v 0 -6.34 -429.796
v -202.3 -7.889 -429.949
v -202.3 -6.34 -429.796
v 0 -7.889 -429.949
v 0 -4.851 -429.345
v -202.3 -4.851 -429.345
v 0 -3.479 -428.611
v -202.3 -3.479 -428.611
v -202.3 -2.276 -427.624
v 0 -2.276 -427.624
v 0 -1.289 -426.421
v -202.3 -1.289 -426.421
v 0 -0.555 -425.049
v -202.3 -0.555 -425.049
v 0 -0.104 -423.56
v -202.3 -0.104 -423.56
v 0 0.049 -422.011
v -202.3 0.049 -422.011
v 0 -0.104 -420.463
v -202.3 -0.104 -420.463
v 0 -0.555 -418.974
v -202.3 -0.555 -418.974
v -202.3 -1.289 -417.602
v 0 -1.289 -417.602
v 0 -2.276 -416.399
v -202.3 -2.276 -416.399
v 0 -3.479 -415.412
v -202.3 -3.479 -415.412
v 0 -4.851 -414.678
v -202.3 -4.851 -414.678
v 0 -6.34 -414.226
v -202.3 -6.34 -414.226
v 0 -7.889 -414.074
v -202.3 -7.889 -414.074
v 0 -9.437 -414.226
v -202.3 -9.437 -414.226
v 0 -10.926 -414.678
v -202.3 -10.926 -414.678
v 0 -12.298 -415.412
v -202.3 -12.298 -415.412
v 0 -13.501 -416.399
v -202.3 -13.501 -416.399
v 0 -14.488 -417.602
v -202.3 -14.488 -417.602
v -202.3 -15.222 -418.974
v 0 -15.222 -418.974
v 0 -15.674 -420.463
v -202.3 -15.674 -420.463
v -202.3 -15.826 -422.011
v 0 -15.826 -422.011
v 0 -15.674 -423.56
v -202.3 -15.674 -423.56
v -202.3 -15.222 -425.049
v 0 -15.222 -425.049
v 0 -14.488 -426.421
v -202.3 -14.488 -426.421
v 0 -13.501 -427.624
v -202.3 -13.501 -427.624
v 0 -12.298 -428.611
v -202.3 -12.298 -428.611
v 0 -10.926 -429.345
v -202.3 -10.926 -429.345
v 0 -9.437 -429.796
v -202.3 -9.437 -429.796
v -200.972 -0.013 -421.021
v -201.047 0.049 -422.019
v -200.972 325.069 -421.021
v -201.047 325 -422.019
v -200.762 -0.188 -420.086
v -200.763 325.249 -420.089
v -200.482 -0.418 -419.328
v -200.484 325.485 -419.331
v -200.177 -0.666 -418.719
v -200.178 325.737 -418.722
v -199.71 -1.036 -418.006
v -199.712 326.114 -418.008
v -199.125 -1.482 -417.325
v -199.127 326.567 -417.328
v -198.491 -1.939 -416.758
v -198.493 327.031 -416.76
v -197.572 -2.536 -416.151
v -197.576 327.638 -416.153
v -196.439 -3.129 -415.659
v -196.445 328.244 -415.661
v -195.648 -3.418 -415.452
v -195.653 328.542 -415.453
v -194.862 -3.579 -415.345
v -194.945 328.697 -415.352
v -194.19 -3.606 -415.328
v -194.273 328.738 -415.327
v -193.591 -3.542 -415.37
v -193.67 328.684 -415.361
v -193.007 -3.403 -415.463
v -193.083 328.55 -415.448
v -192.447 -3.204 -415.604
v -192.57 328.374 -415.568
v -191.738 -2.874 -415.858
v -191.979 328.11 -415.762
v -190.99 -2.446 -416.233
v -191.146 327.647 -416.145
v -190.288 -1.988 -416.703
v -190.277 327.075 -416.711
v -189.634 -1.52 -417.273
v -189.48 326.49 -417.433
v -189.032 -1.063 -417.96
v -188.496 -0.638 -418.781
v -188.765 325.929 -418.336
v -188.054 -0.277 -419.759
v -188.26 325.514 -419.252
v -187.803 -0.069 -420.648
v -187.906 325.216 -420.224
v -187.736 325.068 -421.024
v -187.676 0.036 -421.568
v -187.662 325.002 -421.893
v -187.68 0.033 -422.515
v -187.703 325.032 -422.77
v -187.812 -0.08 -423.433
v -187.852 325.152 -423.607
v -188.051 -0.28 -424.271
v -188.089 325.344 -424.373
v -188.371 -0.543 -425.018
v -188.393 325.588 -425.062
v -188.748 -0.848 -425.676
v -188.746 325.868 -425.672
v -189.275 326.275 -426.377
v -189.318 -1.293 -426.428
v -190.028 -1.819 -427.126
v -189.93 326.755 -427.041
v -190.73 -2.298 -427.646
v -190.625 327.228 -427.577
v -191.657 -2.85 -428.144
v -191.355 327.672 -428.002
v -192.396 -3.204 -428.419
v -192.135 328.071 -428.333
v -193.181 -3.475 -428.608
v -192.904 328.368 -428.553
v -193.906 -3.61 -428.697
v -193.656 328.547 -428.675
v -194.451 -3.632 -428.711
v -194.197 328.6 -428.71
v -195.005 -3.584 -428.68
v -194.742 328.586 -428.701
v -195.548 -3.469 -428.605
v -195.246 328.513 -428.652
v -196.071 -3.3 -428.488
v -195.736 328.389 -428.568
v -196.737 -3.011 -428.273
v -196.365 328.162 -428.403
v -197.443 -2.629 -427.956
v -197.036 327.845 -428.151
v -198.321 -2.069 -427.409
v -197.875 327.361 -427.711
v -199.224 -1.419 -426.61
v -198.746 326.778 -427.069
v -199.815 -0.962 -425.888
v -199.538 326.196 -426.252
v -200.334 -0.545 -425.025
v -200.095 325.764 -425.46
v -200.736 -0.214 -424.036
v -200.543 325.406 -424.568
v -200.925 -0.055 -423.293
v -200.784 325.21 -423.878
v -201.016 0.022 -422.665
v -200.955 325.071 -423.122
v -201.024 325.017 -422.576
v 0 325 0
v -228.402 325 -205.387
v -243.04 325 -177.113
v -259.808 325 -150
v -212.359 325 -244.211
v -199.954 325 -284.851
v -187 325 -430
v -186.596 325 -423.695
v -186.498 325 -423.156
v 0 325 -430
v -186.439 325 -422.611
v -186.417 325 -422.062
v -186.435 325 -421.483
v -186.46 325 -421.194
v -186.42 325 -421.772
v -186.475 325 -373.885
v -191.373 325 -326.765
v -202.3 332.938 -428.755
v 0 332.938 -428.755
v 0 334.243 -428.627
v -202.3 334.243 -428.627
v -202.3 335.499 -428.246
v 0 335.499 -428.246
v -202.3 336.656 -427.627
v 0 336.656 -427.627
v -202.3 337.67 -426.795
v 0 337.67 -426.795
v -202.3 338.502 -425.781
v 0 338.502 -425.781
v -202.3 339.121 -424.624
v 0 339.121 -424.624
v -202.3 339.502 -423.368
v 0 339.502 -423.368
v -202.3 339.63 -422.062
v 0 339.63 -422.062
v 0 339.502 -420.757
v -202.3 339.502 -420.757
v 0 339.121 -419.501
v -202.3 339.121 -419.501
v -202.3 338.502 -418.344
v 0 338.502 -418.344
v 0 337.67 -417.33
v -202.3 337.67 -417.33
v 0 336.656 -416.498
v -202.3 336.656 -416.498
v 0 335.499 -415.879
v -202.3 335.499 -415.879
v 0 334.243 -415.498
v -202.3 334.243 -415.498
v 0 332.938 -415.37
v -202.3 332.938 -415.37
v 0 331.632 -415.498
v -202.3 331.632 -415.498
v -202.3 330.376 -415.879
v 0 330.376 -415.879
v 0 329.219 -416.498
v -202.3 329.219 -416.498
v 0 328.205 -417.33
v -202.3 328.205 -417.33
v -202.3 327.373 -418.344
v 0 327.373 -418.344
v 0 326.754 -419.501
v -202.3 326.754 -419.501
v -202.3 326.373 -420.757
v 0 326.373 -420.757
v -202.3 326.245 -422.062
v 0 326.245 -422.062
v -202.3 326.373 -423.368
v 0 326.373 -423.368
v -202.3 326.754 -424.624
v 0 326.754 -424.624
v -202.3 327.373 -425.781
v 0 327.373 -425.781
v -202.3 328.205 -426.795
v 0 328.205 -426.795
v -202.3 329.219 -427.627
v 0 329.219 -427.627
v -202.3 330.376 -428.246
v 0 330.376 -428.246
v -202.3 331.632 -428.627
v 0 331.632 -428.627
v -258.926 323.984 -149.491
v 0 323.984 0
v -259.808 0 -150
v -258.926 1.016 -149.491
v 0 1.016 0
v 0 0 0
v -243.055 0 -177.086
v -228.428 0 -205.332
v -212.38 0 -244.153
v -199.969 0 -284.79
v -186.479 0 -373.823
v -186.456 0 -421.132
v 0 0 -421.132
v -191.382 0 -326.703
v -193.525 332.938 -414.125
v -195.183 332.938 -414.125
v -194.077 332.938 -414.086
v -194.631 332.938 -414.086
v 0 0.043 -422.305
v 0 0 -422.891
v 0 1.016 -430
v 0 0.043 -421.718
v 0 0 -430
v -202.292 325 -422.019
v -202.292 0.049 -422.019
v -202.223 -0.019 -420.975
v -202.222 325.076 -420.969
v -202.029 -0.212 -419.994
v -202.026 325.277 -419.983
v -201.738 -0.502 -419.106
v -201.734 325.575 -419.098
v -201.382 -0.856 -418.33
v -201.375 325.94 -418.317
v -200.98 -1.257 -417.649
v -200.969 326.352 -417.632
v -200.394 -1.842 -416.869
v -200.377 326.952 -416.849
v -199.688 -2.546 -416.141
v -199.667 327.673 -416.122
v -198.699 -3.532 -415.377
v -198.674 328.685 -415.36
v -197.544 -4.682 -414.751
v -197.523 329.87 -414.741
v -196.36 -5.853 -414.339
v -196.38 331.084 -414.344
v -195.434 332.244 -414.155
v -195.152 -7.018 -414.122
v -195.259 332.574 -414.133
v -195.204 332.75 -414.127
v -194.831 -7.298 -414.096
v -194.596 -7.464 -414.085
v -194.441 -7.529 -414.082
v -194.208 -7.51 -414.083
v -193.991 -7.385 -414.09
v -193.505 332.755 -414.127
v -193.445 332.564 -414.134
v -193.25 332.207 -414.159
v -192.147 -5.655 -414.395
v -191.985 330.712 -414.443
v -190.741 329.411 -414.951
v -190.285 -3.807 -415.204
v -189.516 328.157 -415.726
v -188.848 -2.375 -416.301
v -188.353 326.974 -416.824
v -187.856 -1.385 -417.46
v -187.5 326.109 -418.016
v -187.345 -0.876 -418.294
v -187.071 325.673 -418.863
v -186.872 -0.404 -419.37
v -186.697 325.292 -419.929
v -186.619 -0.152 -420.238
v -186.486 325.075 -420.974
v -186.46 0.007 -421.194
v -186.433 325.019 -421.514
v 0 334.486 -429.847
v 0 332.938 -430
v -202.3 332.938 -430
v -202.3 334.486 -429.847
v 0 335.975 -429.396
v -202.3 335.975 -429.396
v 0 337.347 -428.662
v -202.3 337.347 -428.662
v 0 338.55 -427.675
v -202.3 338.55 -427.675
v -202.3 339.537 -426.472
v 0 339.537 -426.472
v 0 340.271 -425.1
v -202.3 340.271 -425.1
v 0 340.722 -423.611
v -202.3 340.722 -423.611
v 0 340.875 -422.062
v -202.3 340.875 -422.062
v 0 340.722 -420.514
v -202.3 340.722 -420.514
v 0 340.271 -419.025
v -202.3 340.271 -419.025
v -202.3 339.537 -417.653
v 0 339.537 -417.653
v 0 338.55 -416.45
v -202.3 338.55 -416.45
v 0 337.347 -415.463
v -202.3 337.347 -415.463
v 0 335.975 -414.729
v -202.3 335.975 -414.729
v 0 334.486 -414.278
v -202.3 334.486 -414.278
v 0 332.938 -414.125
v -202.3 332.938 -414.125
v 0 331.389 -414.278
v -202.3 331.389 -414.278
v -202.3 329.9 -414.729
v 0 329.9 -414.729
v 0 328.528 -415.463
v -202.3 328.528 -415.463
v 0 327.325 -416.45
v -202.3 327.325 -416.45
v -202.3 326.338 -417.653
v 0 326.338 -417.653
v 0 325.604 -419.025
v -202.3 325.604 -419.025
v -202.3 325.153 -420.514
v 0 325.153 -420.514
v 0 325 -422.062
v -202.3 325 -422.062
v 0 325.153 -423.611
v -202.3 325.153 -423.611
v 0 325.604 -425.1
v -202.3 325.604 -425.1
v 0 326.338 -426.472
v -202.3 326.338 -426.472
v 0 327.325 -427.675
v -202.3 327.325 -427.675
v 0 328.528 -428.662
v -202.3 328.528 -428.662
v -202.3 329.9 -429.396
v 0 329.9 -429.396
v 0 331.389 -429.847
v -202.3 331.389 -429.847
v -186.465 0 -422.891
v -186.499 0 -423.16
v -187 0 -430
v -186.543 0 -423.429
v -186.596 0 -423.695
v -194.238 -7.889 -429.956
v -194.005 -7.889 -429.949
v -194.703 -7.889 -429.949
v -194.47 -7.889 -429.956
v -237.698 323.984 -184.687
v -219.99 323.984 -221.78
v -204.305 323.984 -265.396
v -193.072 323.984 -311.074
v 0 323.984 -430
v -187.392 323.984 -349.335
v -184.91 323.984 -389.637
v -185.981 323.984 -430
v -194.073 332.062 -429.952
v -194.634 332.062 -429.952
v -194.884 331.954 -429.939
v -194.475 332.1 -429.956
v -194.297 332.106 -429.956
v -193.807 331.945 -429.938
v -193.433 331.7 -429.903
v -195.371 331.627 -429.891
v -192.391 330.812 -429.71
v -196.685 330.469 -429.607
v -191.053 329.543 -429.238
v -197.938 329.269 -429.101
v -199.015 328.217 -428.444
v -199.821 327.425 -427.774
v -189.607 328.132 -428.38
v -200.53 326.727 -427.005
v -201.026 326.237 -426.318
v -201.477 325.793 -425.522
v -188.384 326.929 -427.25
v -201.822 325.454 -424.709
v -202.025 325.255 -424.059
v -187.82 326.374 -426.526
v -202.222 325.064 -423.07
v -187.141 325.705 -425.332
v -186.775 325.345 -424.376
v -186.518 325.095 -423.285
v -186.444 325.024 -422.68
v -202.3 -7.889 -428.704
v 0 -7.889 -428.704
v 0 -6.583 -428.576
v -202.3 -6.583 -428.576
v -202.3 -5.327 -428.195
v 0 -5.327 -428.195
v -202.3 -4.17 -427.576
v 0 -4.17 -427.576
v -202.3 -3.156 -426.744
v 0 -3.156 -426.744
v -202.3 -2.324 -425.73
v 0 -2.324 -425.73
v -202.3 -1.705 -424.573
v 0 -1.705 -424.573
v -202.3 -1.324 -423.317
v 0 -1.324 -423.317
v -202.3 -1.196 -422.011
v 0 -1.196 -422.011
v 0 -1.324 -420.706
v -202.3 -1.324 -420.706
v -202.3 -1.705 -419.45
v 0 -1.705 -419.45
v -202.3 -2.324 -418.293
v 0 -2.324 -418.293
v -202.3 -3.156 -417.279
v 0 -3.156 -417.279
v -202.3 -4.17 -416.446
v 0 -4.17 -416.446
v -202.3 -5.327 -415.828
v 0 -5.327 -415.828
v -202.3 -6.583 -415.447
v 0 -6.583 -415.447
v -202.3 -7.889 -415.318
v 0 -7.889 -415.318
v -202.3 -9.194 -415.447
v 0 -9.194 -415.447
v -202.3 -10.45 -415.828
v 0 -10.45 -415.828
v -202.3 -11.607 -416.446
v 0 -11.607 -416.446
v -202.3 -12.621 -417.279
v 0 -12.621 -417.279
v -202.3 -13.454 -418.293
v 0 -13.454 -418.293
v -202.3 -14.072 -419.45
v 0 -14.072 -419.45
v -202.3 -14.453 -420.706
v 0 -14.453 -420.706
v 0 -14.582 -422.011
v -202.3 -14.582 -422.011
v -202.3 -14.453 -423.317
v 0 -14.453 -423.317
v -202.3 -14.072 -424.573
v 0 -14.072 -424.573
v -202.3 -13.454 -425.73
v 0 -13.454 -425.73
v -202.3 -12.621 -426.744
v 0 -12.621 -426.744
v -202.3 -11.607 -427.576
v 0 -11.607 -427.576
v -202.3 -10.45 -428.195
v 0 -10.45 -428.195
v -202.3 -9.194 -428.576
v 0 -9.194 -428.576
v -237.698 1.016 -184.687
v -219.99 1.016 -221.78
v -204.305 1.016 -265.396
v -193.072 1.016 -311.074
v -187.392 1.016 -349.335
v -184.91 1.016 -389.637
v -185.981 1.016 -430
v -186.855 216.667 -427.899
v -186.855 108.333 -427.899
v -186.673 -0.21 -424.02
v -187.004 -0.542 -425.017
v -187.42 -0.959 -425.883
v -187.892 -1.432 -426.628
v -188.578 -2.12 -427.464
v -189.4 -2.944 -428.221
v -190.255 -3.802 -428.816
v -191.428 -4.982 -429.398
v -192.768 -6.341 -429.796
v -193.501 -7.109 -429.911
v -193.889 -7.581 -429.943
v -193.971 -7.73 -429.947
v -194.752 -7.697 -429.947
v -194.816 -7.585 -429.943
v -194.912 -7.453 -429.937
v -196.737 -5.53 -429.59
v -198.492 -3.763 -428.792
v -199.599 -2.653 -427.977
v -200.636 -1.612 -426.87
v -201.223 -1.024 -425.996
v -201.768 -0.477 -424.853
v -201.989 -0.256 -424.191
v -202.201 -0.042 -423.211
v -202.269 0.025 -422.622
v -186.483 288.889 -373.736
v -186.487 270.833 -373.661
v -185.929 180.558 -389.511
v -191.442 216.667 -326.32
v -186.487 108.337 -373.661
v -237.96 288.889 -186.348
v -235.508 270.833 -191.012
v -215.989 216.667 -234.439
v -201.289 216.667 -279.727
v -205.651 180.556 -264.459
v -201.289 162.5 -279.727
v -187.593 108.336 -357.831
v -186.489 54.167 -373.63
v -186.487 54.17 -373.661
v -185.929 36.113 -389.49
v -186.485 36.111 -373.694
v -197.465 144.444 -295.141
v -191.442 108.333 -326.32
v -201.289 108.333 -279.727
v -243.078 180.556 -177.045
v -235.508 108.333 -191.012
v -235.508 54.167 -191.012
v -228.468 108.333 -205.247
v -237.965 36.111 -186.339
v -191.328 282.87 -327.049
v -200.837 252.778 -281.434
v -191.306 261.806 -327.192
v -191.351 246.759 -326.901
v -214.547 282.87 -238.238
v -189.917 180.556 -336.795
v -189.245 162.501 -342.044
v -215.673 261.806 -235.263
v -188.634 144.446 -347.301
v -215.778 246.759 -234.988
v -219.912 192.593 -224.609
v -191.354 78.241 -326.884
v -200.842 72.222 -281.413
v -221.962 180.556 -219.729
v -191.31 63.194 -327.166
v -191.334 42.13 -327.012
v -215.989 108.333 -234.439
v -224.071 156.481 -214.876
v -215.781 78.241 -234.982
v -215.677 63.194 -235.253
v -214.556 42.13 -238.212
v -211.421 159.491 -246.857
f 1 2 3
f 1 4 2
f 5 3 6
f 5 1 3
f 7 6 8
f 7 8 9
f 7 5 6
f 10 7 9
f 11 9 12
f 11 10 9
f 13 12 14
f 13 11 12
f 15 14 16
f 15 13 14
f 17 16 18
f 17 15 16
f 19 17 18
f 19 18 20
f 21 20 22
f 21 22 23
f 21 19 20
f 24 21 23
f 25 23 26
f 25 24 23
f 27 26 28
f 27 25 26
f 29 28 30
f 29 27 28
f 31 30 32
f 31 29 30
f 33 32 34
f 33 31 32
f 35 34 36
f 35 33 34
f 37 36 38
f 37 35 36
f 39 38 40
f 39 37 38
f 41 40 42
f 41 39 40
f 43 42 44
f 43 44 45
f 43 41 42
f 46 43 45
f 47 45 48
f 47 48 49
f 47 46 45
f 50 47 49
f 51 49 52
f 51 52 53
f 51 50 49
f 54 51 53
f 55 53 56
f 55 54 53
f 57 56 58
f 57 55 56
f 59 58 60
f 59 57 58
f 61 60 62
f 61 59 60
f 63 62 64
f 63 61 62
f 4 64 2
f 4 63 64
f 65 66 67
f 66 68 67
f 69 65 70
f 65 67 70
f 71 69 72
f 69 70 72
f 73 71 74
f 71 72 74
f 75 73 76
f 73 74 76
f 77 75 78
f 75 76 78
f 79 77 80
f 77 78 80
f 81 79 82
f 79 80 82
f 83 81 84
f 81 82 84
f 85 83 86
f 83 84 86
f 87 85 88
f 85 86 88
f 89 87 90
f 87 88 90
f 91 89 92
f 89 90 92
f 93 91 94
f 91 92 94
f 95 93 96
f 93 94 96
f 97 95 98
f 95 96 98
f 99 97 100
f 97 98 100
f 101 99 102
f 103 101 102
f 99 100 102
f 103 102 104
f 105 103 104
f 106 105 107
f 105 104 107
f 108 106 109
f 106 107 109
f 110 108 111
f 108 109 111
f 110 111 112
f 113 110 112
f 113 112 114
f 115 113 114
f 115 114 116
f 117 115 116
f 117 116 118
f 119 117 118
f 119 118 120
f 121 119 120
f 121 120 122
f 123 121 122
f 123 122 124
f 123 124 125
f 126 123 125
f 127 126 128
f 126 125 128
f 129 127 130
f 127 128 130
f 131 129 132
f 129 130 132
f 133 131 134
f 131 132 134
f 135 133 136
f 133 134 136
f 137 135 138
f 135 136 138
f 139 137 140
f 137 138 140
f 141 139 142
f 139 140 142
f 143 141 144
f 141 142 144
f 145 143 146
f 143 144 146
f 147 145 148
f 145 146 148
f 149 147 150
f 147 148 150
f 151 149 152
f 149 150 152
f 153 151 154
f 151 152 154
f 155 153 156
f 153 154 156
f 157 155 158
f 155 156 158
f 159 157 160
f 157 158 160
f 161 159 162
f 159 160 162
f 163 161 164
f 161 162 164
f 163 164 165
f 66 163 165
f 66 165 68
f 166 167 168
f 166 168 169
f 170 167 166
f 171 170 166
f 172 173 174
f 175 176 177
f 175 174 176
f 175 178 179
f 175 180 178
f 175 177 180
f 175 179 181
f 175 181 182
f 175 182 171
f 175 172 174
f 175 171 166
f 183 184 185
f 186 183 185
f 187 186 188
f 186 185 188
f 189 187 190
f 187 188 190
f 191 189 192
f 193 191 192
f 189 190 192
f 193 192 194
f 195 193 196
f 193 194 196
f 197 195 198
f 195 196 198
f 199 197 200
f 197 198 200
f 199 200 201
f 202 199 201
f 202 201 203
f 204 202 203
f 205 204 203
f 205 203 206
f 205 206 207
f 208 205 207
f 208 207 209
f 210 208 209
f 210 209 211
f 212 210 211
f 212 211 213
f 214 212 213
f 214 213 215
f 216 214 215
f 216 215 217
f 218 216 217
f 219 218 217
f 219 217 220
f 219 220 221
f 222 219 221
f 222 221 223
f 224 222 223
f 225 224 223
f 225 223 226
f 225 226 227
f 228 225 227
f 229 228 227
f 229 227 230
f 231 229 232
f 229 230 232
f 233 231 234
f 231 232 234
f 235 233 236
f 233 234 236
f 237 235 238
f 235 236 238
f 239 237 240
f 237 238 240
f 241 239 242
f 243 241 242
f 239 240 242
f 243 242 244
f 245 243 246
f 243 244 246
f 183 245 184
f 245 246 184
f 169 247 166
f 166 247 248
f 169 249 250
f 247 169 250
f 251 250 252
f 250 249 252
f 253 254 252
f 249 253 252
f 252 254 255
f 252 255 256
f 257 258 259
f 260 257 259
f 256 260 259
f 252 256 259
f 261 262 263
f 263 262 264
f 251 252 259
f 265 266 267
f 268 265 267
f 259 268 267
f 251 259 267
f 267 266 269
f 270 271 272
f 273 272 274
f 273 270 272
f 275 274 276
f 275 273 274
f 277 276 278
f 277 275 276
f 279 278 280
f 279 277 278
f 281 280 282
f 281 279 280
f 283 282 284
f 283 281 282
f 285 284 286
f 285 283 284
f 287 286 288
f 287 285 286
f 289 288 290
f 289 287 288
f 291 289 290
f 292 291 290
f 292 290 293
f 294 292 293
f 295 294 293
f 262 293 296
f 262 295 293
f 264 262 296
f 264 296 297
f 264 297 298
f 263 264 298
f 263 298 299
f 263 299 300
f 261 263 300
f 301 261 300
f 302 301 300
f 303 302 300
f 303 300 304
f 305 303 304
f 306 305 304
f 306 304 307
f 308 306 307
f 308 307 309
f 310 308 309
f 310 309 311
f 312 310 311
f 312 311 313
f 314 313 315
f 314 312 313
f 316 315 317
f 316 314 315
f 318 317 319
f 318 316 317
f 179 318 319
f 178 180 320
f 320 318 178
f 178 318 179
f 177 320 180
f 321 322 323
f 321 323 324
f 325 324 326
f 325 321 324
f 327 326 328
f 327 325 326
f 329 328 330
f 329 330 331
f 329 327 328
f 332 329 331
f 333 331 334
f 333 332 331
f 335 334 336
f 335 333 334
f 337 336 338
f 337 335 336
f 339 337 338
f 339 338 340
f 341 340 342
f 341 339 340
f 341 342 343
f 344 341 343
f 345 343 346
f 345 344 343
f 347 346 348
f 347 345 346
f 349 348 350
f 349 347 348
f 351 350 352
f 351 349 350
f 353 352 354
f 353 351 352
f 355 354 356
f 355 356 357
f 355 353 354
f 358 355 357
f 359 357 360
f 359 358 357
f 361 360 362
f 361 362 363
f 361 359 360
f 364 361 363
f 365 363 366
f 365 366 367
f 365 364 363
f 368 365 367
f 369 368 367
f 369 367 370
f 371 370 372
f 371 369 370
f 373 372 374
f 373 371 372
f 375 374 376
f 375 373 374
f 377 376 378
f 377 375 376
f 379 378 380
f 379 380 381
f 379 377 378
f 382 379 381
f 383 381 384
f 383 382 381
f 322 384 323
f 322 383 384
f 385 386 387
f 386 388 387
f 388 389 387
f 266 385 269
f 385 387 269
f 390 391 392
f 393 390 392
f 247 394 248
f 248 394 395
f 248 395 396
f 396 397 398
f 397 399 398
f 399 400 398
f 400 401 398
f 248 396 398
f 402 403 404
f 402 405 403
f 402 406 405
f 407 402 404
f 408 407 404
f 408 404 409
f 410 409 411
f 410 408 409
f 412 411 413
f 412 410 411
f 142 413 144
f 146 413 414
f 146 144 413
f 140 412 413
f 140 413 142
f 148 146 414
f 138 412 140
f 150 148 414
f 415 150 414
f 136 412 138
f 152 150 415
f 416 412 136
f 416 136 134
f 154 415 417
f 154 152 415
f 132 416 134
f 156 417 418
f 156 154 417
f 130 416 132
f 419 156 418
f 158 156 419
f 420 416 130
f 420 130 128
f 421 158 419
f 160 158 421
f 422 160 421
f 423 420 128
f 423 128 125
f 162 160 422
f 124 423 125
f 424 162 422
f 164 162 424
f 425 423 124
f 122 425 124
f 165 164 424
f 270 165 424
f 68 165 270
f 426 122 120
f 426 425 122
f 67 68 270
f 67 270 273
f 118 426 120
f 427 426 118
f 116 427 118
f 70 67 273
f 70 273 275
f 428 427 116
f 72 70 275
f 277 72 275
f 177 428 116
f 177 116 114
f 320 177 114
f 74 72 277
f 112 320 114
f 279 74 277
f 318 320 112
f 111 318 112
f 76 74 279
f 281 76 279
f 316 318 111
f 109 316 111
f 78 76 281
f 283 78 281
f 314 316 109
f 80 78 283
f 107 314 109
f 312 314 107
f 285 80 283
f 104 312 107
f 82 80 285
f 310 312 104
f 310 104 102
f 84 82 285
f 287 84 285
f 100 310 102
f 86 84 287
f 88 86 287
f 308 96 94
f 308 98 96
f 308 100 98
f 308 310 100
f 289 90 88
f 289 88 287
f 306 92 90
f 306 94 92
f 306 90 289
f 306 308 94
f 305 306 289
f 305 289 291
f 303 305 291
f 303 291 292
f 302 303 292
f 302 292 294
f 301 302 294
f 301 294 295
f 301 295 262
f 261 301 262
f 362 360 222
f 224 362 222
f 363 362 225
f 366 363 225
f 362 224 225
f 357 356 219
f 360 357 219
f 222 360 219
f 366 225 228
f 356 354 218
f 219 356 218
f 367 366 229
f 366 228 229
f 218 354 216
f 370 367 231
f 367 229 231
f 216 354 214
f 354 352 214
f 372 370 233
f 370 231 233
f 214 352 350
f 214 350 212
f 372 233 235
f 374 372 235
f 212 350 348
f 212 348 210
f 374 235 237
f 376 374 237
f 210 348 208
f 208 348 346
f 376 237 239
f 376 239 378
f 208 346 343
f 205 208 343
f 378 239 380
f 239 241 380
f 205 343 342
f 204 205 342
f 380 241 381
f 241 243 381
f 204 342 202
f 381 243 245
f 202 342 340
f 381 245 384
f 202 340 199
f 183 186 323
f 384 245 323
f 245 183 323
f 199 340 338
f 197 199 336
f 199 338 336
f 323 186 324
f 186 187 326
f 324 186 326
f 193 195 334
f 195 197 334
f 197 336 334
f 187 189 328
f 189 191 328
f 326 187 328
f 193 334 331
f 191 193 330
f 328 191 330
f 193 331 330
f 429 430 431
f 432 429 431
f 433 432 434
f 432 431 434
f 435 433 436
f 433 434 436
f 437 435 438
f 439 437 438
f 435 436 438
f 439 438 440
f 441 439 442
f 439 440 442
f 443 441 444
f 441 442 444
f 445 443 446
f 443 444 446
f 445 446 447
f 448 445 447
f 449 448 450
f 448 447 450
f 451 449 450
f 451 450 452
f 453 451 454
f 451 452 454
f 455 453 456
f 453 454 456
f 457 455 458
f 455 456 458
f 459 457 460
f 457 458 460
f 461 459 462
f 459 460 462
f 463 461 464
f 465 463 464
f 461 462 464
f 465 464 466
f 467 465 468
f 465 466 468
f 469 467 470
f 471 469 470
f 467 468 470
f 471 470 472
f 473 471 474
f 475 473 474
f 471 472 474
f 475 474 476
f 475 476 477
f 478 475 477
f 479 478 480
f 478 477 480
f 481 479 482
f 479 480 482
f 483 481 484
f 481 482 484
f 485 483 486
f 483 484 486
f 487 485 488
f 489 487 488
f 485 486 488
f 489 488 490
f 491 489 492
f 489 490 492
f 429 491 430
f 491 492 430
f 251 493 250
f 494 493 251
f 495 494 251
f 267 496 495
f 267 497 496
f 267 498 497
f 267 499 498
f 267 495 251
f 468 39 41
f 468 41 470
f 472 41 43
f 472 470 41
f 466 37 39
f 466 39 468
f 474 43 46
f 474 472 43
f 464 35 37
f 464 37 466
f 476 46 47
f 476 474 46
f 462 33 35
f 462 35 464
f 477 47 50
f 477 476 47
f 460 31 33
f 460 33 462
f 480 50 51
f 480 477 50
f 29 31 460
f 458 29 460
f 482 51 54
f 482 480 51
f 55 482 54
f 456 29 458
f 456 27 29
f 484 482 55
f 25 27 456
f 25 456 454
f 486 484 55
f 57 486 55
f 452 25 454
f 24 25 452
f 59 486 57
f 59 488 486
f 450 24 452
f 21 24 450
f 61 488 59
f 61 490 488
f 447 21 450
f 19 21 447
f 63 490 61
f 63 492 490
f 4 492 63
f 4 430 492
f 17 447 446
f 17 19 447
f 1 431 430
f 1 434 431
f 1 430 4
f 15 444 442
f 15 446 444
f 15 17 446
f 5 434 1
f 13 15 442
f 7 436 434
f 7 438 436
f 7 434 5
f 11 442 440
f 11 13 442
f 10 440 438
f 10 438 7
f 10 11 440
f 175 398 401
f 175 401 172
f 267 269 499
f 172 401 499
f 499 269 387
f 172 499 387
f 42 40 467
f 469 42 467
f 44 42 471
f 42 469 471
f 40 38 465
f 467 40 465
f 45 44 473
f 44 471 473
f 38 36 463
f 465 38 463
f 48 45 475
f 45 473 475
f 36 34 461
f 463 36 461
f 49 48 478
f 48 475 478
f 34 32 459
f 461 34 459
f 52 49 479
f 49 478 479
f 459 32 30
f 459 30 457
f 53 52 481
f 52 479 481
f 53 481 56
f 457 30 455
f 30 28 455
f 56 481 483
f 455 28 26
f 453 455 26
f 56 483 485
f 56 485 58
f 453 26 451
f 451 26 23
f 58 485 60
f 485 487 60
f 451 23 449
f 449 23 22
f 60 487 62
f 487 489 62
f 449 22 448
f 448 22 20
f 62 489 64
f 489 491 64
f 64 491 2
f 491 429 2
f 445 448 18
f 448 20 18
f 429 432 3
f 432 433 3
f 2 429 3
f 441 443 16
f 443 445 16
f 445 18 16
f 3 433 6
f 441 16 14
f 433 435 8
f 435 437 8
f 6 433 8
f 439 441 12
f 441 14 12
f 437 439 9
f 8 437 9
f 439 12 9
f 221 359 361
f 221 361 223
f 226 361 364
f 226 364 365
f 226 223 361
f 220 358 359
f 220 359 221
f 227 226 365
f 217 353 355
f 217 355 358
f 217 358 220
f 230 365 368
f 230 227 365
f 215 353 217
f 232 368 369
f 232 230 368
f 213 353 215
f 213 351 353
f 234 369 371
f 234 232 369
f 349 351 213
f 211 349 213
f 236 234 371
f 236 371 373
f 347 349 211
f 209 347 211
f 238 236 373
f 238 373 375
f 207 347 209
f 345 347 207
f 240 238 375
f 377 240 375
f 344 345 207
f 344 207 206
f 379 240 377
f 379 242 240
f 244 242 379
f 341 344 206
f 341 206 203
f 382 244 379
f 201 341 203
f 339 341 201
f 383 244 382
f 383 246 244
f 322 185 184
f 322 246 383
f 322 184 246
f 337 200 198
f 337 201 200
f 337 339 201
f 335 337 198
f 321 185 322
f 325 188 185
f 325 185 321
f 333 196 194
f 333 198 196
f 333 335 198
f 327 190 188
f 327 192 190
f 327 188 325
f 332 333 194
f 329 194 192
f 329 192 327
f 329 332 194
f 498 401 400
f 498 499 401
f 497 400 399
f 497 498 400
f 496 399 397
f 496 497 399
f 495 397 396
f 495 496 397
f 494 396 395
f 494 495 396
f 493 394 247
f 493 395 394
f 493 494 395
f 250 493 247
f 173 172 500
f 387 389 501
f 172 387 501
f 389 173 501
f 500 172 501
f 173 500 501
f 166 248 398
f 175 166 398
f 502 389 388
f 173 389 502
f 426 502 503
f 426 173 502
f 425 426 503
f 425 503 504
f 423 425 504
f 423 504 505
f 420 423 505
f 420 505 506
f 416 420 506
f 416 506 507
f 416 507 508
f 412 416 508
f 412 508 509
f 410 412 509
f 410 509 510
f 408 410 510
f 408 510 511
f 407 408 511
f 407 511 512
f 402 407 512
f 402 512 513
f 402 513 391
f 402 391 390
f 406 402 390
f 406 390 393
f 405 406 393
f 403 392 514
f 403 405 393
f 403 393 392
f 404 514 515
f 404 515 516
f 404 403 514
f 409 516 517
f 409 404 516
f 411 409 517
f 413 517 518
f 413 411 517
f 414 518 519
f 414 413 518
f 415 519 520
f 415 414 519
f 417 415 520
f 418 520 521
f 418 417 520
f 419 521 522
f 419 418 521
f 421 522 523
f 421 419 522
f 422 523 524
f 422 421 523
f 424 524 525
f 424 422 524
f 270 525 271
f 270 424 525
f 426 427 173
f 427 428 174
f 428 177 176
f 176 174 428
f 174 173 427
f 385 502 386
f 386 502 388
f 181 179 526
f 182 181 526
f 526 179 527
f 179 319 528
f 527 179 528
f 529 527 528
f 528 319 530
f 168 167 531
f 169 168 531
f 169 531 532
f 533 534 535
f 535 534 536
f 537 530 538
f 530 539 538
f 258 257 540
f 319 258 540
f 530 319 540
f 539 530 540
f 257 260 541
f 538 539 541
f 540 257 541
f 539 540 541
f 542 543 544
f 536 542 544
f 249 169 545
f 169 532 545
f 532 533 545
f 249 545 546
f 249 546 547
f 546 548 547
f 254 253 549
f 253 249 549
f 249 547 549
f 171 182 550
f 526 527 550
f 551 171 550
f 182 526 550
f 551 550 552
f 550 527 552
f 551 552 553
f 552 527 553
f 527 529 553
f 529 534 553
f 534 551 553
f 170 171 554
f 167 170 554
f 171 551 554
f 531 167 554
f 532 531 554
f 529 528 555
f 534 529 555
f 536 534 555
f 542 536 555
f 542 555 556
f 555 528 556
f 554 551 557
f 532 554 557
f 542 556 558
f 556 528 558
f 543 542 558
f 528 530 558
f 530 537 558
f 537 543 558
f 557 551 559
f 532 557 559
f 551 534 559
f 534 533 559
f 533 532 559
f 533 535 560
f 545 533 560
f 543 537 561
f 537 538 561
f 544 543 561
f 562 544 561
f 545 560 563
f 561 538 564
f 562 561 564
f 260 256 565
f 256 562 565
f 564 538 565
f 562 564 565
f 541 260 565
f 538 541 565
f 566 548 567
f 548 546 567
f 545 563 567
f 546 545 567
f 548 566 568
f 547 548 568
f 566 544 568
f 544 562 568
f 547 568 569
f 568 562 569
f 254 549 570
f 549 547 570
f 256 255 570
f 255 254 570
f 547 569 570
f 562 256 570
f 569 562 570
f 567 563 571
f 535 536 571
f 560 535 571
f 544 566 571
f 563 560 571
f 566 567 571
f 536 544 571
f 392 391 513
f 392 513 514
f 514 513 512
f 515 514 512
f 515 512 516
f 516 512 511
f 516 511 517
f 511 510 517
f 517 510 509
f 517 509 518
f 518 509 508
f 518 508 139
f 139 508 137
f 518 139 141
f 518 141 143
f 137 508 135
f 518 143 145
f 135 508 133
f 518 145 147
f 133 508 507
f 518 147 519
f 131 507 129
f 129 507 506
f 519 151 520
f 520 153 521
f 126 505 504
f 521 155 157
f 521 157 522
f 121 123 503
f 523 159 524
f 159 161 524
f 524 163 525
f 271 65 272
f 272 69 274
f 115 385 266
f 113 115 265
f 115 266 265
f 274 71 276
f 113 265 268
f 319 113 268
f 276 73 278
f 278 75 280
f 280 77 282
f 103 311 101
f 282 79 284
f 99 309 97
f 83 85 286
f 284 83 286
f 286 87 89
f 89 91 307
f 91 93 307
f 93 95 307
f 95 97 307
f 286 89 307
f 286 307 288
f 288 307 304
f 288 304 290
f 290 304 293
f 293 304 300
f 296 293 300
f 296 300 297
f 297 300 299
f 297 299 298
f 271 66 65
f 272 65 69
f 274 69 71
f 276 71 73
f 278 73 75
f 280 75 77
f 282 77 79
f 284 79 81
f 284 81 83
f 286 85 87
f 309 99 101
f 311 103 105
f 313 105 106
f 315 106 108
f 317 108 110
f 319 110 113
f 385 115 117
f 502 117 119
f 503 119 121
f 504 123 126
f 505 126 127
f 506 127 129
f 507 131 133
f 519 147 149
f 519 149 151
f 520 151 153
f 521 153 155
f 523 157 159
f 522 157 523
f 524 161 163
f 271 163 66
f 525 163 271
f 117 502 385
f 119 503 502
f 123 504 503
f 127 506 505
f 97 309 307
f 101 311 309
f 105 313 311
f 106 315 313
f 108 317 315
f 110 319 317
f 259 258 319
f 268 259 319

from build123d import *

# Parameters (mm, degrees)
BOSS_EXTRUDE1_DEPTH      = 325
SHELL1_T                 = -1.016
SKETCH2_R                = 7.9375
BOSS_EXTRUDE2_DEPTH      = 202.3
SKETCH3_R                = 6.6929
CUT_EXTRUDE1_DEPTH       = 260.807621235
SKETCH4_R                = 7.9375
SKETCH4_R_2              = 6.6929
BOSS_EXTRUDE3_DEPTH      = 15.875
BOSS_EXTRUDE3_DEPTH_BACK = 340.875
SKETCH6_R                = 7.9375
SKETCH6_R_2              = 6.6929
BOSS_EXTRUDE9_DEPTH      = 0.0001
BOSS_EXTRUDE9_DEPTH_BACK = 202.3
CUT_EXTRUDE2_DEPTH       = 260.807621235


with BuildPart() as part:
    # Sketch1 → Boss-Extrude1 (new body)
    with BuildSketch(Plane(origin=(0, 0, 0), x_dir=(1, 0, 0), z_dir=(0, 1, 0))):
        with BuildLine():
            Line((0, 0), (0, 430))
            Line((0, 430), (-187, 430))
            add(Edge.make_bspline(
                [(-187, 430), (-180.049319148, 332.332930929), (-204.798877093, 231.689816753), (-259.807621135, 150)],
                knots=[0, 0, 0, 0, 1, 1, 1, 1], degree=3))
            Line((-259.807621135, 150), (0, 0))
        make_face()
    extrude(amount=BOSS_EXTRUDE1_DEPTH)

    # Shell1
    shell1_openings = [part.faces().sort_by_distance(p)[0] for p in [
        (-93.5, 162.5, -430),
        (0, 162.5, -215),
        (-129.903810568, 162.5, -75),
    ]]
    offset(amount=SHELL1_T, openings=shell1_openings, kind=Kind.INTERSECTION)

    # Sketch4 → Boss-Extrude3 (add, two sides)
    with BuildSketch(Plane(origin=(0, 325, 0), x_dir=(-1, 0, 0), z_dir=(0, 1, 0))) as boss_extrude3_sk:
        with Locations((194.354011633, -422.019061054)):
            Circle(SKETCH4_R)
        with Locations((194.354011633, -422.019061054)):
            Circle(SKETCH4_R_2, mode=Mode.SUBTRACT)
    extrude(amount=BOSS_EXTRUDE3_DEPTH)
    extrude(boss_extrude3_sk.sketch, amount=-BOSS_EXTRUDE3_DEPTH_BACK)

    # Sketch7 → Cut-Extrude2 (cut, through all)
    with BuildSketch(Plane(origin=(0, 0, 0), x_dir=(0, 0, -1), z_dir=(1, 0, 0))):
        with BuildLine():
            Line((414.125, 332.9375), (402.216319392, 332.9375))
            Line((402.216319392, 332.9375), (402.216319392, 354.156251259))
            Line((402.216319392, 354.156251259), (446.927199566, 354.156251259))
            Line((446.927199566, 354.156251259), (446.927199566, 332.9375))
            Line((446.927199566, 332.9375), (430, 332.9375))
            ThreePointArc((430, 332.9375), (422.0625, 325), (414.125, 332.9375))
        make_face()
        with BuildLine():
            Line((414.073884985, -7.888658782), (410.063917237, -7.888658782))
            Line((410.063917237, -7.888658782), (410.063917237, -17.848986148))
            Line((410.063917237, -17.848986148), (432.903222186, -17.848986148))
            Line((432.903222186, -17.848986148), (432.903222186, -7.888658782))
            Line((432.903222186, -7.888658782), (429.948884985, -7.888658782))
            ThreePointArc((429.948884985, -7.888658782), (422.011384985, 0.048841218), (414.073884985, -7.888658782))
        make_face()
    extrude(amount=-CUT_EXTRUDE2_DEPTH, mode=Mode.SUBTRACT)


with BuildPart() as body_2:
    # Sketch2 → Boss-Extrude2 (new body)
    with BuildSketch(Plane(origin=(0, 0, 0), x_dir=(0, 0, -1), z_dir=(1, 0, 0))):
        with Locations((422.0625, 332.9375)):
            Circle(SKETCH2_R)
    extrude(amount=-BOSS_EXTRUDE2_DEPTH)

    # Sketch3 → Cut-Extrude1 (cut, through all)
    with BuildSketch(Plane(origin=(0, 0, 0), x_dir=(0, 0, -1), z_dir=(1, 0, 0))):
        with Locations((422.0625, 332.9375)):
            Circle(SKETCH3_R)
    extrude(amount=-CUT_EXTRUDE1_DEPTH, mode=Mode.SUBTRACT)


with BuildPart() as body_3:
    # Sketch6 → Boss-Extrude9 (new body, two sides)
    with BuildSketch(Plane(origin=(0, 0, 0), x_dir=(0, 0, -1), z_dir=(1, 0, 0))) as boss_extrude9_sk:
        with Locations((422.011384985, -7.888658782)):
            Circle(SKETCH6_R)
        with Locations((422.011384985, -7.888658782)):
            Circle(SKETCH6_R_2, mode=Mode.SUBTRACT)
    extrude(amount=BOSS_EXTRUDE9_DEPTH)
    extrude(boss_extrude9_sk.sketch, amount=-BOSS_EXTRUDE9_DEPTH_BACK)


solid = Compound([part.part, body_2.part, body_3.part])
